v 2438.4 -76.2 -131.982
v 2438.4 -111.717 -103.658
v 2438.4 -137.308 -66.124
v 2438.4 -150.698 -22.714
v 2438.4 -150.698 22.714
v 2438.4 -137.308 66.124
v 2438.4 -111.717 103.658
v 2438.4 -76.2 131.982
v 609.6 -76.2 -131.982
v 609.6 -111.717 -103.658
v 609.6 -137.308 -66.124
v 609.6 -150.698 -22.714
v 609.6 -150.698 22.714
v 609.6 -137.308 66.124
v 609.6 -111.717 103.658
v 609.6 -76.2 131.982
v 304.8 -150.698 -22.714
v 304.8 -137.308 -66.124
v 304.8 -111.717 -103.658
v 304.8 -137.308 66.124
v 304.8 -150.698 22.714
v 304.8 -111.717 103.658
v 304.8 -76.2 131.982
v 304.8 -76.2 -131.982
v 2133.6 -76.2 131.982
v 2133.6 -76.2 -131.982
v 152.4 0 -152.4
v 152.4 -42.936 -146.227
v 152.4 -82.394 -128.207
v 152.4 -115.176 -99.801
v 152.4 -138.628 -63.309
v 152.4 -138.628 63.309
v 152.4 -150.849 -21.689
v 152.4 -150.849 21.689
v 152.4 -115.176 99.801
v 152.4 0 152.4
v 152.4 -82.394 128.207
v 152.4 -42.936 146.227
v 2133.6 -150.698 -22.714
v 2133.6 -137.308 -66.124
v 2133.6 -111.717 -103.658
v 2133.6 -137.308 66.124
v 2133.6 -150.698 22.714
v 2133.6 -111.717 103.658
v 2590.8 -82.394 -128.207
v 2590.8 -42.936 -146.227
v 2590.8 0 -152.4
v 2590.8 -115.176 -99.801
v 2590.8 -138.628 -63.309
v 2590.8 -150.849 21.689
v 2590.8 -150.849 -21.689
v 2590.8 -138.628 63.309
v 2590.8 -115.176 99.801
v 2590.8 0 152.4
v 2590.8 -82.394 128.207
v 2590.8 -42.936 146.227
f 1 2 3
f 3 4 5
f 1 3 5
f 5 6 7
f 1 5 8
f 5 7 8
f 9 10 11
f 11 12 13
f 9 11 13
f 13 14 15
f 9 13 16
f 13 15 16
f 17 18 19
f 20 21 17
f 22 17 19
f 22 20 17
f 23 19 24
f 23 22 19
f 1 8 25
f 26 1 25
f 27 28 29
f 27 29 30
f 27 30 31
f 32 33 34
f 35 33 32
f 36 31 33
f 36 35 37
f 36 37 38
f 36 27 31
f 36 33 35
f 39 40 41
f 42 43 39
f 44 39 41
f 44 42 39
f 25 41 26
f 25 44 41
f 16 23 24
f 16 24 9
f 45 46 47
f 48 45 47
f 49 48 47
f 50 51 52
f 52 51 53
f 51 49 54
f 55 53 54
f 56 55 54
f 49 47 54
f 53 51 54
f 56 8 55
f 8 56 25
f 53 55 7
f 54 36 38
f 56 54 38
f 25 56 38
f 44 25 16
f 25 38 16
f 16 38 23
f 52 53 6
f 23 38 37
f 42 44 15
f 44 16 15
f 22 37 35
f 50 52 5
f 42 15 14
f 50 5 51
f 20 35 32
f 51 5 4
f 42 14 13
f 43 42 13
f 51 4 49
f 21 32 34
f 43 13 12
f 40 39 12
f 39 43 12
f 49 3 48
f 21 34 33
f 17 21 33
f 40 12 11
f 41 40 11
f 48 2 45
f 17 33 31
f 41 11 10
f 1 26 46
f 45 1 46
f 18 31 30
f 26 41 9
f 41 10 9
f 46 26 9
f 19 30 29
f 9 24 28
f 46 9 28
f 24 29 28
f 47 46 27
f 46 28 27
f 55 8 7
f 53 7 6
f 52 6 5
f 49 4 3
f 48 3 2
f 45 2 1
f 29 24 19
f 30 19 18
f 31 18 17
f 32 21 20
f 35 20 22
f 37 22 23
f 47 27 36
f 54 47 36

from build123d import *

# Parameters (mm, degrees)
BASE_DEPTH      = 2743.2
SKETCH2_W       = 304.8
SKETCH2_H       = 76.2
LEFT_SLOT_DEPTH = 2752.653640995
LEFT_CUT_DEPTH  = 152.4


with BuildPart() as part:
    # Sketch1 → Base (new body)
    with BuildSketch(Plane(origin=(0, 0, 0), x_dir=(0, 0, -1), z_dir=(1, 0, 0))):
        with BuildLine():
            Line((152.4, 0), (-152.4, 0))
            ThreePointArc((-152.4, 0), (0, -152.4), (152.4, 0))
        make_face()
    extrude(amount=BASE_DEPTH)

    # Sketch2 → Left Slot (cut, symmetric)
    with BuildSketch(Plane.XY):
        with Locations((457.2, -114.3)):
            Rectangle(SKETCH2_W, SKETCH2_H)
    left_slot = extrude(amount=LEFT_SLOT_DEPTH, both=True, mode=Mode.SUBTRACT)

    # Right Slot: Left Slot across plane
    add(left_slot.mirror(Plane(origin=(1371.6, 0, 0), x_dir=(0, 0, 1), z_dir=(1, 0, 0))), mode=Mode.SUBTRACT)

    # Sketch3 → Left Cut (cut)
    with BuildSketch(Plane.ZY):
        with BuildLine():
            Line((152.4, 0), (-152.4, 0))
            ThreePointArc((-152.4, 0), (0, -152.4), (152.4, 0))
        make_face()
    left_cut = extrude(amount=-LEFT_CUT_DEPTH, mode=Mode.SUBTRACT)

    # Right Cut: Left Cut across plane
    add(left_cut.mirror(Plane(origin=(1371.6, 0, 0), x_dir=(0, 0, 1), z_dir=(1, 0, 0))), mode=Mode.SUBTRACT)


solid = part.part
